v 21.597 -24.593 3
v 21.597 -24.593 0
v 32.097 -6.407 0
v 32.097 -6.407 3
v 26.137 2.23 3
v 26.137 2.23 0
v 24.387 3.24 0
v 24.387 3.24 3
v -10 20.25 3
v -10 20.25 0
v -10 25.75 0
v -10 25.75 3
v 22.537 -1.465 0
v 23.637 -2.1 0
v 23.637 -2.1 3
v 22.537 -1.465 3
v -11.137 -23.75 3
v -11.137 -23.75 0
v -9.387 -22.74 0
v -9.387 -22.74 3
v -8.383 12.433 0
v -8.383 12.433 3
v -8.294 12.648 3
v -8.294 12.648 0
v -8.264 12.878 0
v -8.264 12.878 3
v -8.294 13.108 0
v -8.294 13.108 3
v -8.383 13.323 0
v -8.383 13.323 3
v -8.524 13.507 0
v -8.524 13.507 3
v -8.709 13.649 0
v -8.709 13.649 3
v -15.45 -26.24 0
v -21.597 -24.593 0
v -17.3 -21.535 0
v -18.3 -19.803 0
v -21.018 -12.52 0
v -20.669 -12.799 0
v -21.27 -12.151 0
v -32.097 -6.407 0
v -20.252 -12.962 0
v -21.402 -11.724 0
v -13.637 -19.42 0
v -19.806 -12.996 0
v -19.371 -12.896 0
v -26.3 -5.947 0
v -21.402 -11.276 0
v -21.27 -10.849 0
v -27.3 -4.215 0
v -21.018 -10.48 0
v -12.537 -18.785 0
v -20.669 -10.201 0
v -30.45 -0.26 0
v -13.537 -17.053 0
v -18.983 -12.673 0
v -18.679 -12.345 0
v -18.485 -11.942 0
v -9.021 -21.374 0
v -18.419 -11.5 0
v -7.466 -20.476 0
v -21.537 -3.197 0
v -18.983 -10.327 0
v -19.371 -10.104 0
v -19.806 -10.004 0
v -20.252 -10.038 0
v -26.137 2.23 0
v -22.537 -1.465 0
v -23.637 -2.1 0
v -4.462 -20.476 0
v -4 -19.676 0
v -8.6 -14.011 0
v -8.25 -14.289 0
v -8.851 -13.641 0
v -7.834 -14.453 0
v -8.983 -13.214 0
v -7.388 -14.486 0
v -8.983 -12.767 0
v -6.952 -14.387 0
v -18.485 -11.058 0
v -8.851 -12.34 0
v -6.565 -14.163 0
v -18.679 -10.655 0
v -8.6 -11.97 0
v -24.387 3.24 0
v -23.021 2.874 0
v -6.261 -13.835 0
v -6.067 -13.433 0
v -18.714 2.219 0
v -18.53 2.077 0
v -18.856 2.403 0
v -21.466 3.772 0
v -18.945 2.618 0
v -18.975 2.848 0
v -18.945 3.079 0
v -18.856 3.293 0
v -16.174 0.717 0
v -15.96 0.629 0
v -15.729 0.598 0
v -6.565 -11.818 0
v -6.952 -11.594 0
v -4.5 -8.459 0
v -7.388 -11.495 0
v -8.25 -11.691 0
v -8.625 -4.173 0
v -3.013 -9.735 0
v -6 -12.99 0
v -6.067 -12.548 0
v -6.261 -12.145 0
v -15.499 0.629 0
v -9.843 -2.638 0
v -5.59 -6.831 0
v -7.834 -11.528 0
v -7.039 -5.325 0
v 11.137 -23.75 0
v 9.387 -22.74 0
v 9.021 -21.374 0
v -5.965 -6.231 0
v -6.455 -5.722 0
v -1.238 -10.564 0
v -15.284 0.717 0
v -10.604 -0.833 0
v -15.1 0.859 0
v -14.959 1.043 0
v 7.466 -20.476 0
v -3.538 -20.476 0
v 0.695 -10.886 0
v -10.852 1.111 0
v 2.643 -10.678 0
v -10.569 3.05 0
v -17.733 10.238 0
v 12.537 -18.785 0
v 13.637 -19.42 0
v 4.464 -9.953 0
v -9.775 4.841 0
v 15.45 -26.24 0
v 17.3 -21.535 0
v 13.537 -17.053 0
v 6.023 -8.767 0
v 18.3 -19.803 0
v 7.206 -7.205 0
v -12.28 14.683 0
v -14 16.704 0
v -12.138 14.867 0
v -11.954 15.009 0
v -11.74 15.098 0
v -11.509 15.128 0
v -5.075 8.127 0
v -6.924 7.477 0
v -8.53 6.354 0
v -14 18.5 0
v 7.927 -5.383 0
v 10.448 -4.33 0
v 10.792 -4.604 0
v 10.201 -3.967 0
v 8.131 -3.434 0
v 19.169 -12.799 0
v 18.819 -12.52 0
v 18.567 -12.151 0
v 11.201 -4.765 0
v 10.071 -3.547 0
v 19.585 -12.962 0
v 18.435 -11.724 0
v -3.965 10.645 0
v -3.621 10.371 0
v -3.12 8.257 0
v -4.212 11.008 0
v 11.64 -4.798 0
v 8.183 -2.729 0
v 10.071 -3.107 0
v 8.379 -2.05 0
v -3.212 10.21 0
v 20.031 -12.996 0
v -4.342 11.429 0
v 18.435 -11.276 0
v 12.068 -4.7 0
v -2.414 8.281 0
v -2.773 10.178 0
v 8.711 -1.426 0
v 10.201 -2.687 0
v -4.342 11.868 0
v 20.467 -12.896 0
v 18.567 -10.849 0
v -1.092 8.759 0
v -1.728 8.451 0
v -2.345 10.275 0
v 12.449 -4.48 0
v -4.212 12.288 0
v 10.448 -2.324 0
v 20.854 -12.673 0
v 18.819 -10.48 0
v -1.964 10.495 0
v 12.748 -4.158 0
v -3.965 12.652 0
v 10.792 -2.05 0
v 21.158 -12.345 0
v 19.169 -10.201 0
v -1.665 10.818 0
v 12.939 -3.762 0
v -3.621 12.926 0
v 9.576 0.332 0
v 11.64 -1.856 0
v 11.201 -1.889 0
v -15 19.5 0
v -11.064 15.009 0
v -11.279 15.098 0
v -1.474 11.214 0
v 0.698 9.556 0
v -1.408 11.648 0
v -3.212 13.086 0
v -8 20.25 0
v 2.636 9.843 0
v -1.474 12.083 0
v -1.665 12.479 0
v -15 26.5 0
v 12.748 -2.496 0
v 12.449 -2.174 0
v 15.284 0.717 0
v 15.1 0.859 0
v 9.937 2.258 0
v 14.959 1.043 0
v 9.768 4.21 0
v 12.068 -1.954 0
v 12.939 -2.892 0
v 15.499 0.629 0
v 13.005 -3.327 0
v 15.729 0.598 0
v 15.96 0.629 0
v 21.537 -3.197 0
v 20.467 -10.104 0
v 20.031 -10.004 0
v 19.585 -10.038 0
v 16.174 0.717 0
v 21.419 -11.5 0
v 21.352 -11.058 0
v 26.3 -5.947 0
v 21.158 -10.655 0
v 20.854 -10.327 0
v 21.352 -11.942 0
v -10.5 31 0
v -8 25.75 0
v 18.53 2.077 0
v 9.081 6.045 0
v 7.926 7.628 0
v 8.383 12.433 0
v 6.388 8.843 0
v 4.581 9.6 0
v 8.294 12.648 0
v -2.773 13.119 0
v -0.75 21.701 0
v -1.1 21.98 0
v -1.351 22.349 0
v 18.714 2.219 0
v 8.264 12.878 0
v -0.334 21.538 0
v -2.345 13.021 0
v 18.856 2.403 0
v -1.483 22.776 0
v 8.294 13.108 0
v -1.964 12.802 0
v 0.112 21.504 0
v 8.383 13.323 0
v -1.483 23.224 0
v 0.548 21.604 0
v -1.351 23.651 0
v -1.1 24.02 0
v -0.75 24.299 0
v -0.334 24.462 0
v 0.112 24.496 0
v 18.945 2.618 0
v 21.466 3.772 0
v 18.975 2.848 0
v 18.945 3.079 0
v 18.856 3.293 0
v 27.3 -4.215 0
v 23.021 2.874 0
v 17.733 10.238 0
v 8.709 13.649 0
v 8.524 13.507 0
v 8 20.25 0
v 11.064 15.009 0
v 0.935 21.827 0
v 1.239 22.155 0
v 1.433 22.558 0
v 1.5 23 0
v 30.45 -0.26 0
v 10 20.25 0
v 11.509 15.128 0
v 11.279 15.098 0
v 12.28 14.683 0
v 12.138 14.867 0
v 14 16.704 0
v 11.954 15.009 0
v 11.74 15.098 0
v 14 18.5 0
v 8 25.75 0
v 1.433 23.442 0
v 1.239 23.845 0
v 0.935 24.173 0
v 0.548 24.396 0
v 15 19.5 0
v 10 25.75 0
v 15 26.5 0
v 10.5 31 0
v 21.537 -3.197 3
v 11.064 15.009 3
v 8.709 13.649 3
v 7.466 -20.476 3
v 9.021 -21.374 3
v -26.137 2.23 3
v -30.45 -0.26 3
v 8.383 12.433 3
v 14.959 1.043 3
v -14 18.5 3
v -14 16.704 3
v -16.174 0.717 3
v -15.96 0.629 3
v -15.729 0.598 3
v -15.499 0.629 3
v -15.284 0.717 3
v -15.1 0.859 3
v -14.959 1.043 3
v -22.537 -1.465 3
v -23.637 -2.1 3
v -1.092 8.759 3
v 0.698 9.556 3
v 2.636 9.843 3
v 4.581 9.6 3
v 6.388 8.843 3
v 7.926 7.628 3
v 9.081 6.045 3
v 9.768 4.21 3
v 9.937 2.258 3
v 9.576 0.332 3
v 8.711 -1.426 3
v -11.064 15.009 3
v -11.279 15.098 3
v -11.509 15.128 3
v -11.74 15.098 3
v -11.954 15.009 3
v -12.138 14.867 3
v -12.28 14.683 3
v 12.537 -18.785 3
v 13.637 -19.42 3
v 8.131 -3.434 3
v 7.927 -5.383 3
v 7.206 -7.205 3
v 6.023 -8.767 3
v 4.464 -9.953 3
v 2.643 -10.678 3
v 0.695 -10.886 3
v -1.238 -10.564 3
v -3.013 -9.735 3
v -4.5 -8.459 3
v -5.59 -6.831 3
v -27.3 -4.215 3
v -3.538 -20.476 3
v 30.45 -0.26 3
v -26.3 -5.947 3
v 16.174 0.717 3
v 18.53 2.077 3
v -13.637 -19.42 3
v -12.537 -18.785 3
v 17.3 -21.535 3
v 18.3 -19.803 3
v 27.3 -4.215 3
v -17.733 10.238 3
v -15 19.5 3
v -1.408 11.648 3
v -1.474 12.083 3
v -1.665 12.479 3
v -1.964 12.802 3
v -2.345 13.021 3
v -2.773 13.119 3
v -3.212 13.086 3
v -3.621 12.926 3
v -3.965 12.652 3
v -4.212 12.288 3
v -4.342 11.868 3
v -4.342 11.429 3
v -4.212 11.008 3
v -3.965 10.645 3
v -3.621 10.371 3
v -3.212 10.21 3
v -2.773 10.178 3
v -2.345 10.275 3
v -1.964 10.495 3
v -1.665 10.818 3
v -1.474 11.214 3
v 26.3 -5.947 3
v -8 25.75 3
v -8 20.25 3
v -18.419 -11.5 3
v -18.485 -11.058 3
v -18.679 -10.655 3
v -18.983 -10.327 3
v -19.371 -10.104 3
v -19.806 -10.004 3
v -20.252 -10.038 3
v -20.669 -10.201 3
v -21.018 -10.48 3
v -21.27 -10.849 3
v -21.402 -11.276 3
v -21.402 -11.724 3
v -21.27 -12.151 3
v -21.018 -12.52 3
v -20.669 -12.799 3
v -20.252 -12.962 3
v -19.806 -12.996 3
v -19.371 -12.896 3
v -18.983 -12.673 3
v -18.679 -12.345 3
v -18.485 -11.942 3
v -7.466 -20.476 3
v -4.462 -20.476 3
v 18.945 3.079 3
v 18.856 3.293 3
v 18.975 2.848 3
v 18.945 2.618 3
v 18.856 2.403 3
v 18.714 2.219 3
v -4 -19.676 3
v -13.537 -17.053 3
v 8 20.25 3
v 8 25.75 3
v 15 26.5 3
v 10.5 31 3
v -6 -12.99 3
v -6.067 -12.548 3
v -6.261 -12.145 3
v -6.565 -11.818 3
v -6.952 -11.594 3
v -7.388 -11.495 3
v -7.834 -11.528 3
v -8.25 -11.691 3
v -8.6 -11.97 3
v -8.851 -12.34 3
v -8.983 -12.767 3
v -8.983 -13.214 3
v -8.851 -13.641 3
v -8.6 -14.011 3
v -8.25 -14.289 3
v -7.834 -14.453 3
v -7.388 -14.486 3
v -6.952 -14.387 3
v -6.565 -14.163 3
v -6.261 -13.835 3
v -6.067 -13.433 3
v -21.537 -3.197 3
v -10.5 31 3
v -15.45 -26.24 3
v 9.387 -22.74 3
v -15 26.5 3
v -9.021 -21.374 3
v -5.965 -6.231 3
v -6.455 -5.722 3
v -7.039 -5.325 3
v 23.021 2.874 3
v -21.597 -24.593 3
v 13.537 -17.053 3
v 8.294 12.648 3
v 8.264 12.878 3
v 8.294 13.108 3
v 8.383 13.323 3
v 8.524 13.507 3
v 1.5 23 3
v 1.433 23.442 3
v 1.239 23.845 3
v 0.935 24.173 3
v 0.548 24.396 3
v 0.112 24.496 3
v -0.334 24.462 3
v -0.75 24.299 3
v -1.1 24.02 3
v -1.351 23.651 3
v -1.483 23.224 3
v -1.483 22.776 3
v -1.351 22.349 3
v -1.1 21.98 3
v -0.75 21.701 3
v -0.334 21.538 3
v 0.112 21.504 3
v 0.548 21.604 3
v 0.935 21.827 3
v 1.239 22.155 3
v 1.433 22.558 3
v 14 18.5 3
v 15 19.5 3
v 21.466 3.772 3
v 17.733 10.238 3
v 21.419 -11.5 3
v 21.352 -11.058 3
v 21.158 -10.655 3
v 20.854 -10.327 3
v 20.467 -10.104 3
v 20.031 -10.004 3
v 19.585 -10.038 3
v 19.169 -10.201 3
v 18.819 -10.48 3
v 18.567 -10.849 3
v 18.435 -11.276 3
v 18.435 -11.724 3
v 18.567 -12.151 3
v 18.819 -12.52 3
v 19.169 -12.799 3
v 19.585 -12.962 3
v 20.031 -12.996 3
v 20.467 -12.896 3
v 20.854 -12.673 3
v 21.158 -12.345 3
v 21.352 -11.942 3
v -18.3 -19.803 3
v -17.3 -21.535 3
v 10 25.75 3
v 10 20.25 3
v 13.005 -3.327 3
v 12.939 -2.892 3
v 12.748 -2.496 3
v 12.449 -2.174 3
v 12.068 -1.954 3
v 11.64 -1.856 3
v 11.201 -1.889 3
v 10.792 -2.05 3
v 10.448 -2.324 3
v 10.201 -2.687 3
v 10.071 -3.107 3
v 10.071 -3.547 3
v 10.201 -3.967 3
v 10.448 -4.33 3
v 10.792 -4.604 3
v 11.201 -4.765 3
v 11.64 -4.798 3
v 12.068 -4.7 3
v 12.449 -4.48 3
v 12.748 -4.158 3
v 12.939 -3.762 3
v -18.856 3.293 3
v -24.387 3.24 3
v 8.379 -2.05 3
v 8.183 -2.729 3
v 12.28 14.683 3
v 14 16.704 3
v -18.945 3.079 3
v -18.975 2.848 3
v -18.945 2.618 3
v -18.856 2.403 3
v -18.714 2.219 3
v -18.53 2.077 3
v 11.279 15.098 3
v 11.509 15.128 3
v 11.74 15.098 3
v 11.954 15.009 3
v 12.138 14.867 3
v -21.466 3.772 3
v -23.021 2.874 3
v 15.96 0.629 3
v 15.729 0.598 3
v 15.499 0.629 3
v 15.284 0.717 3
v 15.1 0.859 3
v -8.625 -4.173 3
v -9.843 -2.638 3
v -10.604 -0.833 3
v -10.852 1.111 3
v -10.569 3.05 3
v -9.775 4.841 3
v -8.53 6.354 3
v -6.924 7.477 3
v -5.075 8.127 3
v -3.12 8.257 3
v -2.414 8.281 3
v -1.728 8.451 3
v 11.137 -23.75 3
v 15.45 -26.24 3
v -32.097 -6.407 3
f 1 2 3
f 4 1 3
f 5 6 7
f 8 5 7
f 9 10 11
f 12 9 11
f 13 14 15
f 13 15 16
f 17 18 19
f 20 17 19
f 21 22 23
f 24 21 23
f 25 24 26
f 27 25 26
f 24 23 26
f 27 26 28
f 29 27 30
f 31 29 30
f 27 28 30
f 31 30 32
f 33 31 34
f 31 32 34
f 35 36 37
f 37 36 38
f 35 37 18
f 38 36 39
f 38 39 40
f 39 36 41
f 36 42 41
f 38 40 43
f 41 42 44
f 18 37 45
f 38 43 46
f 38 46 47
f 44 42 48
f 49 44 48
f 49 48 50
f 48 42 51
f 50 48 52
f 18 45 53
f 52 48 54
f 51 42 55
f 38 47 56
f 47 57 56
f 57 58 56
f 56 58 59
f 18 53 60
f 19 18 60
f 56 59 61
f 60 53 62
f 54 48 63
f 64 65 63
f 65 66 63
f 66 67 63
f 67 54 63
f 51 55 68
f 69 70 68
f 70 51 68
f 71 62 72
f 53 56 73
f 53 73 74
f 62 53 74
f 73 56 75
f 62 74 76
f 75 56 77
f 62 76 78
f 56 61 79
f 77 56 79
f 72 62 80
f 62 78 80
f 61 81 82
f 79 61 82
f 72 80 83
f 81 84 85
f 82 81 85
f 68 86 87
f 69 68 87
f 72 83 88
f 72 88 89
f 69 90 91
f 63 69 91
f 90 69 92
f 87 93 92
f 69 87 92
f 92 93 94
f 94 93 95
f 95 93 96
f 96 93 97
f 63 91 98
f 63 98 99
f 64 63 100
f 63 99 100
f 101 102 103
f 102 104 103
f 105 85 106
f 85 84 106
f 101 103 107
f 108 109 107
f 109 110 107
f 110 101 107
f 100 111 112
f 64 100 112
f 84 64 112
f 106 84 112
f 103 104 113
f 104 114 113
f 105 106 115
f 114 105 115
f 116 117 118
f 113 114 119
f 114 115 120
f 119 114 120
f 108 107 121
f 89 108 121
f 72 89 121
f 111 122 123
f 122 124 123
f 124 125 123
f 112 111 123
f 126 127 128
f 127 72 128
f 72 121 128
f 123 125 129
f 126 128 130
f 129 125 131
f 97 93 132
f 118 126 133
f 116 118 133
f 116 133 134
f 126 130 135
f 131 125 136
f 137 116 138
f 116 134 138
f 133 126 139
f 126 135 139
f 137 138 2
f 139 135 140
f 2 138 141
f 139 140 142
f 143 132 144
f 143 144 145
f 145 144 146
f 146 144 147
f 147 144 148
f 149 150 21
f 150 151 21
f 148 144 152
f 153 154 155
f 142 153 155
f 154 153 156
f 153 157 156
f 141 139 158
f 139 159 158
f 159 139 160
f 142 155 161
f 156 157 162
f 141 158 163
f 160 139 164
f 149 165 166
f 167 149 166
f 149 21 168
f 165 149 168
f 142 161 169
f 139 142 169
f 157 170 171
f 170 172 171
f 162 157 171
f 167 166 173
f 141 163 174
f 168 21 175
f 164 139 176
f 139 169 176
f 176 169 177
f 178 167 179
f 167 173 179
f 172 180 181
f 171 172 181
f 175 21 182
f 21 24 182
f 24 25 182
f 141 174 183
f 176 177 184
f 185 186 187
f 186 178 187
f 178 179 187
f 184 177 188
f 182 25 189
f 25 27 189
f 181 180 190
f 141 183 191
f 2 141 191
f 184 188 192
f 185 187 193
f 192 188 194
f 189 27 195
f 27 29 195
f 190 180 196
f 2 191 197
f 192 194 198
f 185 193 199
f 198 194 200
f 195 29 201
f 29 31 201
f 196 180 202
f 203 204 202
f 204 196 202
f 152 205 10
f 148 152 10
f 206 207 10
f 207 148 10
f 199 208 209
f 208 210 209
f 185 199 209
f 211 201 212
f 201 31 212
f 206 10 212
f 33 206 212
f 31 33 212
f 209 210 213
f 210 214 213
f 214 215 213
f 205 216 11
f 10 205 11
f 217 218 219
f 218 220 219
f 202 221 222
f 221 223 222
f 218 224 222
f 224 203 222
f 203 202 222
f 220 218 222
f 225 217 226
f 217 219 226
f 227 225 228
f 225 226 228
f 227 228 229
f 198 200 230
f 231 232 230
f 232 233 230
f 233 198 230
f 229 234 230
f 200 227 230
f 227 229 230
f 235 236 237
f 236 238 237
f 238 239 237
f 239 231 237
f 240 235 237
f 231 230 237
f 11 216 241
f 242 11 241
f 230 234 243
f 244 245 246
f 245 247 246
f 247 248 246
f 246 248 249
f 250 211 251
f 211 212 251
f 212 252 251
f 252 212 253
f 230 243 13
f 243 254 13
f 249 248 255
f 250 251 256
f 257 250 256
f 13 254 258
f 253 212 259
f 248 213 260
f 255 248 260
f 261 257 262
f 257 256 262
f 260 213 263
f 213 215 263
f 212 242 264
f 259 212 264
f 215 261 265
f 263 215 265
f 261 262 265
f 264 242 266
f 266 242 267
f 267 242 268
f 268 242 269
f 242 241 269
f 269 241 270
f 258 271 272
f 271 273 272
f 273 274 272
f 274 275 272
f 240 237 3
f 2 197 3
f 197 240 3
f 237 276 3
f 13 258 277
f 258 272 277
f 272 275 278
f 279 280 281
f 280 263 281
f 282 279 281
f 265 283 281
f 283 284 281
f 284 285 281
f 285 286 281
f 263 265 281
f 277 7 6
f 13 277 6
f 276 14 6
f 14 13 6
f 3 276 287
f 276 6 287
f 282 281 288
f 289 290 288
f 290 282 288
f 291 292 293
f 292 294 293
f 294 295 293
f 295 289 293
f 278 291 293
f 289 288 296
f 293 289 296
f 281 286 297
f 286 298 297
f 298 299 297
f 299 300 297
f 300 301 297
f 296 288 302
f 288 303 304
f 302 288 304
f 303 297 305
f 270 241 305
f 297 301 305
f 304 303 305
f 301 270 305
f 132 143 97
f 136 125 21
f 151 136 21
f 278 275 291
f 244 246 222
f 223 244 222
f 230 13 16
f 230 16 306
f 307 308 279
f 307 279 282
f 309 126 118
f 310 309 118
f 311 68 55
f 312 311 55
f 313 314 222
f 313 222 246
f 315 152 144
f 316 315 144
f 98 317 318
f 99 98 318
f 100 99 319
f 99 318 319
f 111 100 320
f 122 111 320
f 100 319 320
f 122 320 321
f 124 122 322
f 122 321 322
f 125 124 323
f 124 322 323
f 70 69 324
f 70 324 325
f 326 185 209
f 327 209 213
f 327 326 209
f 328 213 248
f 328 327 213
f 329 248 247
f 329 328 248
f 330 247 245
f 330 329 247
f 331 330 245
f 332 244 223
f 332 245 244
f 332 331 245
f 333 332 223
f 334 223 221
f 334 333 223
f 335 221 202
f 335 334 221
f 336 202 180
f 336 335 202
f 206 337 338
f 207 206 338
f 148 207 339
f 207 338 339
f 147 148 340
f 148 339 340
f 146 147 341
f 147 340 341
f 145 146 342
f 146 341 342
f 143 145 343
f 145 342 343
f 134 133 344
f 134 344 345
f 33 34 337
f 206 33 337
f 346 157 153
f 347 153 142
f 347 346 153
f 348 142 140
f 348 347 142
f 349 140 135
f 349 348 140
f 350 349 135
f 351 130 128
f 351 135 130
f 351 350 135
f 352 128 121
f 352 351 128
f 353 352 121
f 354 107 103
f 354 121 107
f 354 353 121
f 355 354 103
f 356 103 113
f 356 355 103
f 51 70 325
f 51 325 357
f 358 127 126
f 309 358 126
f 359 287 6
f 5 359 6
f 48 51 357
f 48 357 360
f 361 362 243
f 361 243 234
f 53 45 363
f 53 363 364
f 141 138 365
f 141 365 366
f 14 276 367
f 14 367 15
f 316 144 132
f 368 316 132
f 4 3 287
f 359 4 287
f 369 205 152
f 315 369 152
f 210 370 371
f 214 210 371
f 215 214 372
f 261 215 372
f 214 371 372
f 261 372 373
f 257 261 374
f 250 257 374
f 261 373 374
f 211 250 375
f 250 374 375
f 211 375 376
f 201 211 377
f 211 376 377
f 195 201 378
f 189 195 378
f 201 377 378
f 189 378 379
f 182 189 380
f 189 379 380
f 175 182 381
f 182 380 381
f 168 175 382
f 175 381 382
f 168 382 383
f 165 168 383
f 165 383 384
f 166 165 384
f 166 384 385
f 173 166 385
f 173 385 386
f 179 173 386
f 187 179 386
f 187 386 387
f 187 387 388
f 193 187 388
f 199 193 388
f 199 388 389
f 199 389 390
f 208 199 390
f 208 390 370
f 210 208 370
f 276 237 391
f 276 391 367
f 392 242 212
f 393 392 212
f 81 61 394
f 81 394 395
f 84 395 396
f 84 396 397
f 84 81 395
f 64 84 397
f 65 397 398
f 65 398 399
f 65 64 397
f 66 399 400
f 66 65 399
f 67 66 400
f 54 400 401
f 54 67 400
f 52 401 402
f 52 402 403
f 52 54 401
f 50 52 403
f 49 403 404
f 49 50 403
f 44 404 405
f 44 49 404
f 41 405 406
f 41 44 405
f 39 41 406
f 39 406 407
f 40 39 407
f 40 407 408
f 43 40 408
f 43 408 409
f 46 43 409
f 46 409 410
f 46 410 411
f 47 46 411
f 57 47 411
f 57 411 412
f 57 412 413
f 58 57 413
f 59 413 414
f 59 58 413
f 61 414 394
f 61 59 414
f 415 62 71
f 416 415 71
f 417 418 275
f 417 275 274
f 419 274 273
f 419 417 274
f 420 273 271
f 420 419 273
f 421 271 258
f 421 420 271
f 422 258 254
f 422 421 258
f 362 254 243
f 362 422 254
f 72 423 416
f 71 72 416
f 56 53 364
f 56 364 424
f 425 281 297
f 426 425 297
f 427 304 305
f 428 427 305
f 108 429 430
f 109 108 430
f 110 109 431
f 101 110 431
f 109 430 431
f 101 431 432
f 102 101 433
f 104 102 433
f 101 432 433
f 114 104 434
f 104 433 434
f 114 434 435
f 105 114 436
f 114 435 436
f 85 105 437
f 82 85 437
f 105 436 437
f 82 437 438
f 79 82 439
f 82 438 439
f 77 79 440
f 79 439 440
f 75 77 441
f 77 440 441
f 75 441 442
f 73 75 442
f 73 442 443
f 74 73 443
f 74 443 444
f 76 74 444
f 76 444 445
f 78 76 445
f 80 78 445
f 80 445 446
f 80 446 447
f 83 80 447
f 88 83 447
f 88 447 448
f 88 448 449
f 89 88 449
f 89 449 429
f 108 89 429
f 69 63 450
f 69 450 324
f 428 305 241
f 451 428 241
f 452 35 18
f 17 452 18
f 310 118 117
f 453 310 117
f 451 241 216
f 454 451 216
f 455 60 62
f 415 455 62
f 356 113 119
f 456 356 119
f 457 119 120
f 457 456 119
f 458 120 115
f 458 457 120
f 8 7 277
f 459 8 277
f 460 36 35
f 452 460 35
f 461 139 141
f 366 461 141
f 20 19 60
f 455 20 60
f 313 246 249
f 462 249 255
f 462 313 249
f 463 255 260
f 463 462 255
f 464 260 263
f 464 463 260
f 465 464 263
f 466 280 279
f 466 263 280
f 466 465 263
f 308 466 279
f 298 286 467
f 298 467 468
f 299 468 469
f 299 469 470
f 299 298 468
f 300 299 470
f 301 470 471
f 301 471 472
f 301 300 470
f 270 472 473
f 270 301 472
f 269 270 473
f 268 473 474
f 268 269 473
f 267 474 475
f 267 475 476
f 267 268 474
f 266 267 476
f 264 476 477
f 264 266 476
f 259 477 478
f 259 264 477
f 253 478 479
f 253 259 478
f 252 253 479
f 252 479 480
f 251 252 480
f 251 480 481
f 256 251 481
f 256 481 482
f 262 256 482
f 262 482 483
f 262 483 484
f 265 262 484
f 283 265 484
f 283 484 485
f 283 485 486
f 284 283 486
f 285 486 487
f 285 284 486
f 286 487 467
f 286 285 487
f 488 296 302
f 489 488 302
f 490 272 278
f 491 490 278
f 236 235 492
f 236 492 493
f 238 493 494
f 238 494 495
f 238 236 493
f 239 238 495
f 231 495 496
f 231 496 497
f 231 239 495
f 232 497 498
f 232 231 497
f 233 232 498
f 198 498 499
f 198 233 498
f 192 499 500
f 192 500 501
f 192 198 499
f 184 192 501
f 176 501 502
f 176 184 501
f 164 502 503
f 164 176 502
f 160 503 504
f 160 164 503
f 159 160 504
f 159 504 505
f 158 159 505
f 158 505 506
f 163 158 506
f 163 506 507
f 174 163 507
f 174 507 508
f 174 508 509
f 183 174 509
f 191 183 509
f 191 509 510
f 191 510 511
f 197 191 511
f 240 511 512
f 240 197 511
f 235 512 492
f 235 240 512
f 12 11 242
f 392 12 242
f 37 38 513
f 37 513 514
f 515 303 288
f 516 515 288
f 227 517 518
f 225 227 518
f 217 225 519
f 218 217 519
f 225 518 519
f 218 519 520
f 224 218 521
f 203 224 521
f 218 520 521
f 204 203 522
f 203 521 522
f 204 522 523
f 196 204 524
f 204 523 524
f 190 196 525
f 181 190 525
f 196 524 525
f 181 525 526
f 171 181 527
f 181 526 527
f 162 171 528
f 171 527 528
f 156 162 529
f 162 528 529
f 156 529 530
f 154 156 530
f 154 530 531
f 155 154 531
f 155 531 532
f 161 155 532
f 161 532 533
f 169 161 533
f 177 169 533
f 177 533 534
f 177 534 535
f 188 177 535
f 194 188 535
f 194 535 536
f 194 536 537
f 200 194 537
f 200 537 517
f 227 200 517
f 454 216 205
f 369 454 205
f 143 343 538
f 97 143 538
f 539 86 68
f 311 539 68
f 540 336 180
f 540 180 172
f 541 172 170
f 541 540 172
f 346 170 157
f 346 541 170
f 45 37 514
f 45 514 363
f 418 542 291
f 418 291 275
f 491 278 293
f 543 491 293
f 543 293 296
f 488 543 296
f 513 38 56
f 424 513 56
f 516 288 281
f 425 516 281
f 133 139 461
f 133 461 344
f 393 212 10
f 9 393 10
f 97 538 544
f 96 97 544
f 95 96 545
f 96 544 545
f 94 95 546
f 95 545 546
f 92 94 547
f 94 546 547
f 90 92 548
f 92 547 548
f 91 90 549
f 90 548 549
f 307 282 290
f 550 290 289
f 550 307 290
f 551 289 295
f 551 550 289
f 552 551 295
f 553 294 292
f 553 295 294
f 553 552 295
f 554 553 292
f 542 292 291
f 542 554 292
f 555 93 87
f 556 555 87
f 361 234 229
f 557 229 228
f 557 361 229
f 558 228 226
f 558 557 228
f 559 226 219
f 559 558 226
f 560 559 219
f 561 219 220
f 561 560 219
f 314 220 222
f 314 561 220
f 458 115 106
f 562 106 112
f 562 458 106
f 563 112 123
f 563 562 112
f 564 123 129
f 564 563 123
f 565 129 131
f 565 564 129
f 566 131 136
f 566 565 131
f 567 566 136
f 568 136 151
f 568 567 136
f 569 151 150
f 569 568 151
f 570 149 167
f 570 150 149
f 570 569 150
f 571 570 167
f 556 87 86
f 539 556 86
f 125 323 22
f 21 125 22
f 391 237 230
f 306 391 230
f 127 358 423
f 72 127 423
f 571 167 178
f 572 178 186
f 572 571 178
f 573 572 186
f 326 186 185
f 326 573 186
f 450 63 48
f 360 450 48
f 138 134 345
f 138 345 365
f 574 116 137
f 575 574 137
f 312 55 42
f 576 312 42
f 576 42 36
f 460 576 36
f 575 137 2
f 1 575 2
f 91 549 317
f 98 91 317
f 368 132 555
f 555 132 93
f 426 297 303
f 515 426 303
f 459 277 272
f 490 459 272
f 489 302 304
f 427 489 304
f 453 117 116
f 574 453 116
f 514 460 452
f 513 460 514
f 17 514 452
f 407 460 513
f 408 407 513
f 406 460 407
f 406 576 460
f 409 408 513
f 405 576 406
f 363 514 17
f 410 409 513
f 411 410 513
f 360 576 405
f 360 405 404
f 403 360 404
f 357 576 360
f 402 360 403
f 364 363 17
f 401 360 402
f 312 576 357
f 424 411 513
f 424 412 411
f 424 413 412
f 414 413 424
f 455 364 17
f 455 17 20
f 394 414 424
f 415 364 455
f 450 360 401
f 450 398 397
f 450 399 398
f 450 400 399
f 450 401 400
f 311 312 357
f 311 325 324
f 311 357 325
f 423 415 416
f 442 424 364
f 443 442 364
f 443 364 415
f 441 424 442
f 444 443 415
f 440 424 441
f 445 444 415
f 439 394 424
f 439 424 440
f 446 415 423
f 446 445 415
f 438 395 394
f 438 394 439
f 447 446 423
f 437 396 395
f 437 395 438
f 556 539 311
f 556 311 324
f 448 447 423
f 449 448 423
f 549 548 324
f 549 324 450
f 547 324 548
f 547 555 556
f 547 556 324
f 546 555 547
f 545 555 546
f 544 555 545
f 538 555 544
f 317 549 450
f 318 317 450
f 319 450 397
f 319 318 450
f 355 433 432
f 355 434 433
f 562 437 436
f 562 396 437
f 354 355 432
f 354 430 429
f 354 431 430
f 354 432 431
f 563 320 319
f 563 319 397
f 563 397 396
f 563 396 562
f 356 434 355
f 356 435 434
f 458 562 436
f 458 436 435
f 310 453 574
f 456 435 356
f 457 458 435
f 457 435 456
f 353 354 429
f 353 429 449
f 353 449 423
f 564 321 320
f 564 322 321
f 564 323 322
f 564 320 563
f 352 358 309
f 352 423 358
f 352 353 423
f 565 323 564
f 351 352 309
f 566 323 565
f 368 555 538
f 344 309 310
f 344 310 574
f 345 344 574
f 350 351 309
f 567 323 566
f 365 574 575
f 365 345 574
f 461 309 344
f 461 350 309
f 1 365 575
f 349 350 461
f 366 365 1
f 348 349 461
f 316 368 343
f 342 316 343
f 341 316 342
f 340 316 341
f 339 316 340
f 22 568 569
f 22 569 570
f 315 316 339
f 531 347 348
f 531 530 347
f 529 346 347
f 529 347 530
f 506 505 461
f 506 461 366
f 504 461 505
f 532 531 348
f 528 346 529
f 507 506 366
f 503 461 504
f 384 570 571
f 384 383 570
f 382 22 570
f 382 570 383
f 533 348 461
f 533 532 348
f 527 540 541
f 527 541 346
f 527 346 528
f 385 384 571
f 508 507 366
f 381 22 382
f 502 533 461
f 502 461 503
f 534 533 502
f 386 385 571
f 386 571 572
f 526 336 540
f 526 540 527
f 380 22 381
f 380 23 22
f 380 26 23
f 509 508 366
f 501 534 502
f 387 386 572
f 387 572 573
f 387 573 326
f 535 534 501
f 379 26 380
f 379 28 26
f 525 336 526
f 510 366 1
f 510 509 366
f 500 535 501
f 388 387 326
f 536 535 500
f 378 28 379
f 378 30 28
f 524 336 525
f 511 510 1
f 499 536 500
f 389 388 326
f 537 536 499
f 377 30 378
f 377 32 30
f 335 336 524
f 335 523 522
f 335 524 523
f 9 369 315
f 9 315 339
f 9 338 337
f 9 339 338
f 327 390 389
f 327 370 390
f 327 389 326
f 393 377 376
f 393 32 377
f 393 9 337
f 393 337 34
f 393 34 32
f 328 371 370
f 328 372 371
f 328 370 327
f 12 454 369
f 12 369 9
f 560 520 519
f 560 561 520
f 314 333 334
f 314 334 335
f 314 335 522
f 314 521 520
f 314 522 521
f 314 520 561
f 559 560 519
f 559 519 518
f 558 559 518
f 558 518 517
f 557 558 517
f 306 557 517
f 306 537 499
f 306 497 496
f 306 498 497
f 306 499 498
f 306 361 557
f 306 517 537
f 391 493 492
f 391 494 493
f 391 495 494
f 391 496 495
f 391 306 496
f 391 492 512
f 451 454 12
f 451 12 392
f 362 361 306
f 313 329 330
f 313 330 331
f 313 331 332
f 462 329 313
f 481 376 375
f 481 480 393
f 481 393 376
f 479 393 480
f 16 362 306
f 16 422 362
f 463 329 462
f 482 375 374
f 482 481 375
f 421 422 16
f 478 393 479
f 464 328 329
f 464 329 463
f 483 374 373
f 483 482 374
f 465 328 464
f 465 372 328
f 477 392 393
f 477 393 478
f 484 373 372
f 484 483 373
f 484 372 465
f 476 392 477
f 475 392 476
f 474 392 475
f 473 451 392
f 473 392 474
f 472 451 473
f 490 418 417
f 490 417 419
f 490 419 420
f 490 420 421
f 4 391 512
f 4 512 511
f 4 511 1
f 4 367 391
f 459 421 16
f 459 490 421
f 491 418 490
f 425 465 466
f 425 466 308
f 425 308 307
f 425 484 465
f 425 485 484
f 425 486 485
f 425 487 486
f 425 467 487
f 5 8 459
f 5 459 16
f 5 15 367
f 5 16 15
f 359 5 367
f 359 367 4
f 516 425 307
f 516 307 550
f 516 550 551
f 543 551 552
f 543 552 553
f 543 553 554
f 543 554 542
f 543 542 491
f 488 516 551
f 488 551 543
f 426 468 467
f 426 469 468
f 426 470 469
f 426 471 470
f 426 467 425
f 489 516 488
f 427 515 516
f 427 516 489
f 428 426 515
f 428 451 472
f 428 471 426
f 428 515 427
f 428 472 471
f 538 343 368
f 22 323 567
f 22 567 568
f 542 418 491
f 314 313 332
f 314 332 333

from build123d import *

# Parameters (mm, degrees)
SKETCH1_R           = 1.5
BOSS_EXTRUDE1_DEPTH = 3
SKETCH3_R           = 8.6
CUT_EXTRUDE2_DEPTH  = 4
SKETCH4_R           = 1.5
SKETCH4_R_2         = 1.475
CUT_EXTRUDE3_DEPTH  = 4
CUT_EXTRUDE4_DEPTH  = 4
CUT_EXTRUDE6_DEPTH  = 4
CUT_EXTRUDE7_DEPTH  = 4


with BuildPart() as part:
    # Sketch1 → Boss-Extrude1 (new body)
    with BuildSketch(Plane.XY):
        Polygon((0, -20.476245627), (7.465897773, -20.476245627), (9.02146997, -21.374355653), (9.387495374, -22.740381057), (11.136866689, -23.750381057), (15.4496732, -26.240381057), (21.596787517, -24.59326674), (32.096787517, -6.40673326), (30.4496732, -0.259618943), (26.136866689, 2.230381057), (24.387495374, 3.240381057), (23.02146997, 2.874355653), (21.465897773, 3.772465679), (17.732948887, 10.238122813), (14, 16.703779947), (14, 18.5), (15, 19.5), (15, 23), (15, 26.5), (10.5, 31), (-10.5, 31), (-15, 26.5), (-15, 23), (-15, 19.5), (-14, 18.5), (-14, 16.703779947), (-17.732948887, 10.238122813), (-21.465897773, 3.772465679), (-23.02146997, 2.874355653), (-24.387495374, 3.240381057), (-26.136866689, 2.230381057), (-30.4496732, -0.259618943), (-32.096787517, -6.40673326), (-21.596787517, -24.59326674), (-15.4496732, -26.240381057), (-11.136866689, -23.750381057), (-9.387495374, -22.740381057), (-9.02146997, -21.374355653), (-7.465897773, -20.476245627), align=None)
        with Locations((0, 23)):
            Circle(SKETCH1_R, mode=Mode.SUBTRACT)
        with Locations((19.918584287, -11.5)):
            Circle(SKETCH1_R, mode=Mode.SUBTRACT)
        with Locations((-19.918584287, -11.5)):
            Circle(SKETCH1_R, mode=Mode.SUBTRACT)
        Polygon((8, 23), (8, 25.75), (10, 25.75), (10, 23), (10, 20.25), (8, 20.25), align=None, mode=Mode.SUBTRACT)
        Polygon((12.537014427, -18.785254038), (13.636866689, -19.420254038), (17.300154147, -21.535254038), (18.300154147, -19.80320323), (15.918584287, -18.42820323), (13.537014427, -17.05320323), align=None, mode=Mode.SUBTRACT)
        Polygon((-8, 23), (-8, 20.25), (-10, 20.25), (-10, 23), (-10, 25.75), (-8, 25.75), align=None, mode=Mode.SUBTRACT)
        Polygon((27.300154147, -4.214745962), (23.636866689, -2.099745962), (22.537014427, -1.464745962), (21.537014427, -3.19679677), (23.918584287, -4.57179677), (26.300154147, -5.94679677), align=None, mode=Mode.SUBTRACT)
        Polygon((-22.537014427, -1.464745962), (-23.636866689, -2.099745962), (-27.300154147, -4.214745962), (-26.300154147, -5.94679677), (-23.918584287, -4.57179677), (-21.537014427, -3.19679677), align=None, mode=Mode.SUBTRACT)
        Polygon((-17.300154147, -21.535254038), (-13.636866689, -19.420254038), (-12.537014427, -18.785254038), (-13.537014427, -17.05320323), (-15.918584287, -18.42820323), (-18.300154147, -19.80320323), align=None, mode=Mode.SUBTRACT)
    extrude(amount=BOSS_EXTRUDE1_DEPTH)

    # Sketch3 → Cut-Extrude2 (cut, through all)
    with BuildSketch(Plane.XY.offset(3)):
        Circle(SKETCH3_R)
    extrude(amount=-CUT_EXTRUDE2_DEPTH, mode=Mode.SUBTRACT)

    # Sketch4 → Cut-Extrude3 (cut, through all)
    with BuildSketch(Plane.XY.offset(3)):
        with Locations((-7.5, -12.990381057)):
            Circle(SKETCH4_R)
        with Locations((-2.883414438, 11.648429988)):
            Circle(SKETCH4_R_2)
        with Locations((11.529543503, -3.327104841)):
            Circle(SKETCH4_R_2)
    extrude(amount=-CUT_EXTRUDE3_DEPTH, mode=Mode.SUBTRACT)

    # Sketch5 → Cut-Extrude4 (cut, through all)
    with BuildSketch(Plane.XY.offset(3)):
        with BuildLine():
            ThreePointArc((-5.590405789, -6.830501462), (-6.196392496, -5.963616355), (-7.039450485, -5.324896616))
            ThreePointArc((-7.039450485, -5.324896616), (-10.568748211, 3.049846104), (-3.120184892, 8.256684161))
            ThreePointArc((-3.120184892, 8.256684161), (-2.066447014, 8.348041491), (-1.0917705, 8.758791256))
            ThreePointArc((-1.0917705, 8.758791256), (7.925618309, 7.627881385), (8.710590681, -1.4261827))
            ThreePointArc((8.710590681, -1.4261827), (8.26283951, -2.384425136), (8.131220984, -3.433894641))
            ThreePointArc((8.131220984, -3.433894641), (2.643129902, -10.677727489), (-5.590405789, -6.830501462))
        make_face()
    extrude(amount=-CUT_EXTRUDE4_DEPTH, mode=Mode.SUBTRACT)

    # Sketch7 → Cut-Extrude6 (cut, through all)
    with BuildSketch(Plane.XY.offset(3)):
        with BuildLine():
            Line((12.279936491, 14.683017338), (18.855834264, 3.293228289))
            ThreePointArc((18.855834264, 3.293228289), (18.94474564, 2.617879339), (18.530071655, 2.077465679))
            Line((18.530071655, 2.077465679), (16.174482556, 0.717465679))
            ThreePointArc((16.174482556, 0.717465679), (15.499133606, 0.628554303), (14.958719947, 1.043228289))
            Line((14.958719947, 1.043228289), (8.382822174, 12.433017338))
            ThreePointArc((8.382822174, 12.433017338), (8.293910797, 13.108366288), (8.708584783, 13.648779947))
            Line((8.708584783, 13.648779947), (11.064173881, 15.008779947))
            ThreePointArc((11.064173881, 15.008779947), (11.739522831, 15.097691323), (12.279936491, 14.683017338))
        make_face()
        with BuildLine():
            Line((-12.279936491, 14.683017338), (-18.855834264, 3.293228289))
            ThreePointArc((-18.855834264, 3.293228289), (-18.94474564, 2.617879339), (-18.530071655, 2.077465679))
            Line((-18.530071655, 2.077465679), (-16.174482556, 0.717465679))
            ThreePointArc((-16.174482556, 0.717465679), (-15.499133606, 0.628554303), (-14.958719947, 1.043228289))
            Line((-14.958719947, 1.043228289), (-8.382822174, 12.433017338))
            ThreePointArc((-8.382822174, 12.433017338), (-8.293910797, 13.108366288), (-8.708584783, 13.648779947))
            Line((-8.708584783, 13.648779947), (-11.064173881, 15.008779947))
            ThreePointArc((-11.064173881, 15.008779947), (-11.739522831, 15.097691323), (-12.279936491, 14.683017338))
        make_face()
    extrude(amount=-CUT_EXTRUDE6_DEPTH, mode=Mode.SUBTRACT)

    # Sketch8 → Cut-Extrude7 (cut, through all)
    with BuildSketch(Plane.XY.offset(3)):
        Polygon((-3.538119785, -20.476245627), (-4, -19.676245627), (-4.461880215, -20.476245627), align=None)
    extrude(amount=-CUT_EXTRUDE7_DEPTH, mode=Mode.SUBTRACT)


solid = part.part
